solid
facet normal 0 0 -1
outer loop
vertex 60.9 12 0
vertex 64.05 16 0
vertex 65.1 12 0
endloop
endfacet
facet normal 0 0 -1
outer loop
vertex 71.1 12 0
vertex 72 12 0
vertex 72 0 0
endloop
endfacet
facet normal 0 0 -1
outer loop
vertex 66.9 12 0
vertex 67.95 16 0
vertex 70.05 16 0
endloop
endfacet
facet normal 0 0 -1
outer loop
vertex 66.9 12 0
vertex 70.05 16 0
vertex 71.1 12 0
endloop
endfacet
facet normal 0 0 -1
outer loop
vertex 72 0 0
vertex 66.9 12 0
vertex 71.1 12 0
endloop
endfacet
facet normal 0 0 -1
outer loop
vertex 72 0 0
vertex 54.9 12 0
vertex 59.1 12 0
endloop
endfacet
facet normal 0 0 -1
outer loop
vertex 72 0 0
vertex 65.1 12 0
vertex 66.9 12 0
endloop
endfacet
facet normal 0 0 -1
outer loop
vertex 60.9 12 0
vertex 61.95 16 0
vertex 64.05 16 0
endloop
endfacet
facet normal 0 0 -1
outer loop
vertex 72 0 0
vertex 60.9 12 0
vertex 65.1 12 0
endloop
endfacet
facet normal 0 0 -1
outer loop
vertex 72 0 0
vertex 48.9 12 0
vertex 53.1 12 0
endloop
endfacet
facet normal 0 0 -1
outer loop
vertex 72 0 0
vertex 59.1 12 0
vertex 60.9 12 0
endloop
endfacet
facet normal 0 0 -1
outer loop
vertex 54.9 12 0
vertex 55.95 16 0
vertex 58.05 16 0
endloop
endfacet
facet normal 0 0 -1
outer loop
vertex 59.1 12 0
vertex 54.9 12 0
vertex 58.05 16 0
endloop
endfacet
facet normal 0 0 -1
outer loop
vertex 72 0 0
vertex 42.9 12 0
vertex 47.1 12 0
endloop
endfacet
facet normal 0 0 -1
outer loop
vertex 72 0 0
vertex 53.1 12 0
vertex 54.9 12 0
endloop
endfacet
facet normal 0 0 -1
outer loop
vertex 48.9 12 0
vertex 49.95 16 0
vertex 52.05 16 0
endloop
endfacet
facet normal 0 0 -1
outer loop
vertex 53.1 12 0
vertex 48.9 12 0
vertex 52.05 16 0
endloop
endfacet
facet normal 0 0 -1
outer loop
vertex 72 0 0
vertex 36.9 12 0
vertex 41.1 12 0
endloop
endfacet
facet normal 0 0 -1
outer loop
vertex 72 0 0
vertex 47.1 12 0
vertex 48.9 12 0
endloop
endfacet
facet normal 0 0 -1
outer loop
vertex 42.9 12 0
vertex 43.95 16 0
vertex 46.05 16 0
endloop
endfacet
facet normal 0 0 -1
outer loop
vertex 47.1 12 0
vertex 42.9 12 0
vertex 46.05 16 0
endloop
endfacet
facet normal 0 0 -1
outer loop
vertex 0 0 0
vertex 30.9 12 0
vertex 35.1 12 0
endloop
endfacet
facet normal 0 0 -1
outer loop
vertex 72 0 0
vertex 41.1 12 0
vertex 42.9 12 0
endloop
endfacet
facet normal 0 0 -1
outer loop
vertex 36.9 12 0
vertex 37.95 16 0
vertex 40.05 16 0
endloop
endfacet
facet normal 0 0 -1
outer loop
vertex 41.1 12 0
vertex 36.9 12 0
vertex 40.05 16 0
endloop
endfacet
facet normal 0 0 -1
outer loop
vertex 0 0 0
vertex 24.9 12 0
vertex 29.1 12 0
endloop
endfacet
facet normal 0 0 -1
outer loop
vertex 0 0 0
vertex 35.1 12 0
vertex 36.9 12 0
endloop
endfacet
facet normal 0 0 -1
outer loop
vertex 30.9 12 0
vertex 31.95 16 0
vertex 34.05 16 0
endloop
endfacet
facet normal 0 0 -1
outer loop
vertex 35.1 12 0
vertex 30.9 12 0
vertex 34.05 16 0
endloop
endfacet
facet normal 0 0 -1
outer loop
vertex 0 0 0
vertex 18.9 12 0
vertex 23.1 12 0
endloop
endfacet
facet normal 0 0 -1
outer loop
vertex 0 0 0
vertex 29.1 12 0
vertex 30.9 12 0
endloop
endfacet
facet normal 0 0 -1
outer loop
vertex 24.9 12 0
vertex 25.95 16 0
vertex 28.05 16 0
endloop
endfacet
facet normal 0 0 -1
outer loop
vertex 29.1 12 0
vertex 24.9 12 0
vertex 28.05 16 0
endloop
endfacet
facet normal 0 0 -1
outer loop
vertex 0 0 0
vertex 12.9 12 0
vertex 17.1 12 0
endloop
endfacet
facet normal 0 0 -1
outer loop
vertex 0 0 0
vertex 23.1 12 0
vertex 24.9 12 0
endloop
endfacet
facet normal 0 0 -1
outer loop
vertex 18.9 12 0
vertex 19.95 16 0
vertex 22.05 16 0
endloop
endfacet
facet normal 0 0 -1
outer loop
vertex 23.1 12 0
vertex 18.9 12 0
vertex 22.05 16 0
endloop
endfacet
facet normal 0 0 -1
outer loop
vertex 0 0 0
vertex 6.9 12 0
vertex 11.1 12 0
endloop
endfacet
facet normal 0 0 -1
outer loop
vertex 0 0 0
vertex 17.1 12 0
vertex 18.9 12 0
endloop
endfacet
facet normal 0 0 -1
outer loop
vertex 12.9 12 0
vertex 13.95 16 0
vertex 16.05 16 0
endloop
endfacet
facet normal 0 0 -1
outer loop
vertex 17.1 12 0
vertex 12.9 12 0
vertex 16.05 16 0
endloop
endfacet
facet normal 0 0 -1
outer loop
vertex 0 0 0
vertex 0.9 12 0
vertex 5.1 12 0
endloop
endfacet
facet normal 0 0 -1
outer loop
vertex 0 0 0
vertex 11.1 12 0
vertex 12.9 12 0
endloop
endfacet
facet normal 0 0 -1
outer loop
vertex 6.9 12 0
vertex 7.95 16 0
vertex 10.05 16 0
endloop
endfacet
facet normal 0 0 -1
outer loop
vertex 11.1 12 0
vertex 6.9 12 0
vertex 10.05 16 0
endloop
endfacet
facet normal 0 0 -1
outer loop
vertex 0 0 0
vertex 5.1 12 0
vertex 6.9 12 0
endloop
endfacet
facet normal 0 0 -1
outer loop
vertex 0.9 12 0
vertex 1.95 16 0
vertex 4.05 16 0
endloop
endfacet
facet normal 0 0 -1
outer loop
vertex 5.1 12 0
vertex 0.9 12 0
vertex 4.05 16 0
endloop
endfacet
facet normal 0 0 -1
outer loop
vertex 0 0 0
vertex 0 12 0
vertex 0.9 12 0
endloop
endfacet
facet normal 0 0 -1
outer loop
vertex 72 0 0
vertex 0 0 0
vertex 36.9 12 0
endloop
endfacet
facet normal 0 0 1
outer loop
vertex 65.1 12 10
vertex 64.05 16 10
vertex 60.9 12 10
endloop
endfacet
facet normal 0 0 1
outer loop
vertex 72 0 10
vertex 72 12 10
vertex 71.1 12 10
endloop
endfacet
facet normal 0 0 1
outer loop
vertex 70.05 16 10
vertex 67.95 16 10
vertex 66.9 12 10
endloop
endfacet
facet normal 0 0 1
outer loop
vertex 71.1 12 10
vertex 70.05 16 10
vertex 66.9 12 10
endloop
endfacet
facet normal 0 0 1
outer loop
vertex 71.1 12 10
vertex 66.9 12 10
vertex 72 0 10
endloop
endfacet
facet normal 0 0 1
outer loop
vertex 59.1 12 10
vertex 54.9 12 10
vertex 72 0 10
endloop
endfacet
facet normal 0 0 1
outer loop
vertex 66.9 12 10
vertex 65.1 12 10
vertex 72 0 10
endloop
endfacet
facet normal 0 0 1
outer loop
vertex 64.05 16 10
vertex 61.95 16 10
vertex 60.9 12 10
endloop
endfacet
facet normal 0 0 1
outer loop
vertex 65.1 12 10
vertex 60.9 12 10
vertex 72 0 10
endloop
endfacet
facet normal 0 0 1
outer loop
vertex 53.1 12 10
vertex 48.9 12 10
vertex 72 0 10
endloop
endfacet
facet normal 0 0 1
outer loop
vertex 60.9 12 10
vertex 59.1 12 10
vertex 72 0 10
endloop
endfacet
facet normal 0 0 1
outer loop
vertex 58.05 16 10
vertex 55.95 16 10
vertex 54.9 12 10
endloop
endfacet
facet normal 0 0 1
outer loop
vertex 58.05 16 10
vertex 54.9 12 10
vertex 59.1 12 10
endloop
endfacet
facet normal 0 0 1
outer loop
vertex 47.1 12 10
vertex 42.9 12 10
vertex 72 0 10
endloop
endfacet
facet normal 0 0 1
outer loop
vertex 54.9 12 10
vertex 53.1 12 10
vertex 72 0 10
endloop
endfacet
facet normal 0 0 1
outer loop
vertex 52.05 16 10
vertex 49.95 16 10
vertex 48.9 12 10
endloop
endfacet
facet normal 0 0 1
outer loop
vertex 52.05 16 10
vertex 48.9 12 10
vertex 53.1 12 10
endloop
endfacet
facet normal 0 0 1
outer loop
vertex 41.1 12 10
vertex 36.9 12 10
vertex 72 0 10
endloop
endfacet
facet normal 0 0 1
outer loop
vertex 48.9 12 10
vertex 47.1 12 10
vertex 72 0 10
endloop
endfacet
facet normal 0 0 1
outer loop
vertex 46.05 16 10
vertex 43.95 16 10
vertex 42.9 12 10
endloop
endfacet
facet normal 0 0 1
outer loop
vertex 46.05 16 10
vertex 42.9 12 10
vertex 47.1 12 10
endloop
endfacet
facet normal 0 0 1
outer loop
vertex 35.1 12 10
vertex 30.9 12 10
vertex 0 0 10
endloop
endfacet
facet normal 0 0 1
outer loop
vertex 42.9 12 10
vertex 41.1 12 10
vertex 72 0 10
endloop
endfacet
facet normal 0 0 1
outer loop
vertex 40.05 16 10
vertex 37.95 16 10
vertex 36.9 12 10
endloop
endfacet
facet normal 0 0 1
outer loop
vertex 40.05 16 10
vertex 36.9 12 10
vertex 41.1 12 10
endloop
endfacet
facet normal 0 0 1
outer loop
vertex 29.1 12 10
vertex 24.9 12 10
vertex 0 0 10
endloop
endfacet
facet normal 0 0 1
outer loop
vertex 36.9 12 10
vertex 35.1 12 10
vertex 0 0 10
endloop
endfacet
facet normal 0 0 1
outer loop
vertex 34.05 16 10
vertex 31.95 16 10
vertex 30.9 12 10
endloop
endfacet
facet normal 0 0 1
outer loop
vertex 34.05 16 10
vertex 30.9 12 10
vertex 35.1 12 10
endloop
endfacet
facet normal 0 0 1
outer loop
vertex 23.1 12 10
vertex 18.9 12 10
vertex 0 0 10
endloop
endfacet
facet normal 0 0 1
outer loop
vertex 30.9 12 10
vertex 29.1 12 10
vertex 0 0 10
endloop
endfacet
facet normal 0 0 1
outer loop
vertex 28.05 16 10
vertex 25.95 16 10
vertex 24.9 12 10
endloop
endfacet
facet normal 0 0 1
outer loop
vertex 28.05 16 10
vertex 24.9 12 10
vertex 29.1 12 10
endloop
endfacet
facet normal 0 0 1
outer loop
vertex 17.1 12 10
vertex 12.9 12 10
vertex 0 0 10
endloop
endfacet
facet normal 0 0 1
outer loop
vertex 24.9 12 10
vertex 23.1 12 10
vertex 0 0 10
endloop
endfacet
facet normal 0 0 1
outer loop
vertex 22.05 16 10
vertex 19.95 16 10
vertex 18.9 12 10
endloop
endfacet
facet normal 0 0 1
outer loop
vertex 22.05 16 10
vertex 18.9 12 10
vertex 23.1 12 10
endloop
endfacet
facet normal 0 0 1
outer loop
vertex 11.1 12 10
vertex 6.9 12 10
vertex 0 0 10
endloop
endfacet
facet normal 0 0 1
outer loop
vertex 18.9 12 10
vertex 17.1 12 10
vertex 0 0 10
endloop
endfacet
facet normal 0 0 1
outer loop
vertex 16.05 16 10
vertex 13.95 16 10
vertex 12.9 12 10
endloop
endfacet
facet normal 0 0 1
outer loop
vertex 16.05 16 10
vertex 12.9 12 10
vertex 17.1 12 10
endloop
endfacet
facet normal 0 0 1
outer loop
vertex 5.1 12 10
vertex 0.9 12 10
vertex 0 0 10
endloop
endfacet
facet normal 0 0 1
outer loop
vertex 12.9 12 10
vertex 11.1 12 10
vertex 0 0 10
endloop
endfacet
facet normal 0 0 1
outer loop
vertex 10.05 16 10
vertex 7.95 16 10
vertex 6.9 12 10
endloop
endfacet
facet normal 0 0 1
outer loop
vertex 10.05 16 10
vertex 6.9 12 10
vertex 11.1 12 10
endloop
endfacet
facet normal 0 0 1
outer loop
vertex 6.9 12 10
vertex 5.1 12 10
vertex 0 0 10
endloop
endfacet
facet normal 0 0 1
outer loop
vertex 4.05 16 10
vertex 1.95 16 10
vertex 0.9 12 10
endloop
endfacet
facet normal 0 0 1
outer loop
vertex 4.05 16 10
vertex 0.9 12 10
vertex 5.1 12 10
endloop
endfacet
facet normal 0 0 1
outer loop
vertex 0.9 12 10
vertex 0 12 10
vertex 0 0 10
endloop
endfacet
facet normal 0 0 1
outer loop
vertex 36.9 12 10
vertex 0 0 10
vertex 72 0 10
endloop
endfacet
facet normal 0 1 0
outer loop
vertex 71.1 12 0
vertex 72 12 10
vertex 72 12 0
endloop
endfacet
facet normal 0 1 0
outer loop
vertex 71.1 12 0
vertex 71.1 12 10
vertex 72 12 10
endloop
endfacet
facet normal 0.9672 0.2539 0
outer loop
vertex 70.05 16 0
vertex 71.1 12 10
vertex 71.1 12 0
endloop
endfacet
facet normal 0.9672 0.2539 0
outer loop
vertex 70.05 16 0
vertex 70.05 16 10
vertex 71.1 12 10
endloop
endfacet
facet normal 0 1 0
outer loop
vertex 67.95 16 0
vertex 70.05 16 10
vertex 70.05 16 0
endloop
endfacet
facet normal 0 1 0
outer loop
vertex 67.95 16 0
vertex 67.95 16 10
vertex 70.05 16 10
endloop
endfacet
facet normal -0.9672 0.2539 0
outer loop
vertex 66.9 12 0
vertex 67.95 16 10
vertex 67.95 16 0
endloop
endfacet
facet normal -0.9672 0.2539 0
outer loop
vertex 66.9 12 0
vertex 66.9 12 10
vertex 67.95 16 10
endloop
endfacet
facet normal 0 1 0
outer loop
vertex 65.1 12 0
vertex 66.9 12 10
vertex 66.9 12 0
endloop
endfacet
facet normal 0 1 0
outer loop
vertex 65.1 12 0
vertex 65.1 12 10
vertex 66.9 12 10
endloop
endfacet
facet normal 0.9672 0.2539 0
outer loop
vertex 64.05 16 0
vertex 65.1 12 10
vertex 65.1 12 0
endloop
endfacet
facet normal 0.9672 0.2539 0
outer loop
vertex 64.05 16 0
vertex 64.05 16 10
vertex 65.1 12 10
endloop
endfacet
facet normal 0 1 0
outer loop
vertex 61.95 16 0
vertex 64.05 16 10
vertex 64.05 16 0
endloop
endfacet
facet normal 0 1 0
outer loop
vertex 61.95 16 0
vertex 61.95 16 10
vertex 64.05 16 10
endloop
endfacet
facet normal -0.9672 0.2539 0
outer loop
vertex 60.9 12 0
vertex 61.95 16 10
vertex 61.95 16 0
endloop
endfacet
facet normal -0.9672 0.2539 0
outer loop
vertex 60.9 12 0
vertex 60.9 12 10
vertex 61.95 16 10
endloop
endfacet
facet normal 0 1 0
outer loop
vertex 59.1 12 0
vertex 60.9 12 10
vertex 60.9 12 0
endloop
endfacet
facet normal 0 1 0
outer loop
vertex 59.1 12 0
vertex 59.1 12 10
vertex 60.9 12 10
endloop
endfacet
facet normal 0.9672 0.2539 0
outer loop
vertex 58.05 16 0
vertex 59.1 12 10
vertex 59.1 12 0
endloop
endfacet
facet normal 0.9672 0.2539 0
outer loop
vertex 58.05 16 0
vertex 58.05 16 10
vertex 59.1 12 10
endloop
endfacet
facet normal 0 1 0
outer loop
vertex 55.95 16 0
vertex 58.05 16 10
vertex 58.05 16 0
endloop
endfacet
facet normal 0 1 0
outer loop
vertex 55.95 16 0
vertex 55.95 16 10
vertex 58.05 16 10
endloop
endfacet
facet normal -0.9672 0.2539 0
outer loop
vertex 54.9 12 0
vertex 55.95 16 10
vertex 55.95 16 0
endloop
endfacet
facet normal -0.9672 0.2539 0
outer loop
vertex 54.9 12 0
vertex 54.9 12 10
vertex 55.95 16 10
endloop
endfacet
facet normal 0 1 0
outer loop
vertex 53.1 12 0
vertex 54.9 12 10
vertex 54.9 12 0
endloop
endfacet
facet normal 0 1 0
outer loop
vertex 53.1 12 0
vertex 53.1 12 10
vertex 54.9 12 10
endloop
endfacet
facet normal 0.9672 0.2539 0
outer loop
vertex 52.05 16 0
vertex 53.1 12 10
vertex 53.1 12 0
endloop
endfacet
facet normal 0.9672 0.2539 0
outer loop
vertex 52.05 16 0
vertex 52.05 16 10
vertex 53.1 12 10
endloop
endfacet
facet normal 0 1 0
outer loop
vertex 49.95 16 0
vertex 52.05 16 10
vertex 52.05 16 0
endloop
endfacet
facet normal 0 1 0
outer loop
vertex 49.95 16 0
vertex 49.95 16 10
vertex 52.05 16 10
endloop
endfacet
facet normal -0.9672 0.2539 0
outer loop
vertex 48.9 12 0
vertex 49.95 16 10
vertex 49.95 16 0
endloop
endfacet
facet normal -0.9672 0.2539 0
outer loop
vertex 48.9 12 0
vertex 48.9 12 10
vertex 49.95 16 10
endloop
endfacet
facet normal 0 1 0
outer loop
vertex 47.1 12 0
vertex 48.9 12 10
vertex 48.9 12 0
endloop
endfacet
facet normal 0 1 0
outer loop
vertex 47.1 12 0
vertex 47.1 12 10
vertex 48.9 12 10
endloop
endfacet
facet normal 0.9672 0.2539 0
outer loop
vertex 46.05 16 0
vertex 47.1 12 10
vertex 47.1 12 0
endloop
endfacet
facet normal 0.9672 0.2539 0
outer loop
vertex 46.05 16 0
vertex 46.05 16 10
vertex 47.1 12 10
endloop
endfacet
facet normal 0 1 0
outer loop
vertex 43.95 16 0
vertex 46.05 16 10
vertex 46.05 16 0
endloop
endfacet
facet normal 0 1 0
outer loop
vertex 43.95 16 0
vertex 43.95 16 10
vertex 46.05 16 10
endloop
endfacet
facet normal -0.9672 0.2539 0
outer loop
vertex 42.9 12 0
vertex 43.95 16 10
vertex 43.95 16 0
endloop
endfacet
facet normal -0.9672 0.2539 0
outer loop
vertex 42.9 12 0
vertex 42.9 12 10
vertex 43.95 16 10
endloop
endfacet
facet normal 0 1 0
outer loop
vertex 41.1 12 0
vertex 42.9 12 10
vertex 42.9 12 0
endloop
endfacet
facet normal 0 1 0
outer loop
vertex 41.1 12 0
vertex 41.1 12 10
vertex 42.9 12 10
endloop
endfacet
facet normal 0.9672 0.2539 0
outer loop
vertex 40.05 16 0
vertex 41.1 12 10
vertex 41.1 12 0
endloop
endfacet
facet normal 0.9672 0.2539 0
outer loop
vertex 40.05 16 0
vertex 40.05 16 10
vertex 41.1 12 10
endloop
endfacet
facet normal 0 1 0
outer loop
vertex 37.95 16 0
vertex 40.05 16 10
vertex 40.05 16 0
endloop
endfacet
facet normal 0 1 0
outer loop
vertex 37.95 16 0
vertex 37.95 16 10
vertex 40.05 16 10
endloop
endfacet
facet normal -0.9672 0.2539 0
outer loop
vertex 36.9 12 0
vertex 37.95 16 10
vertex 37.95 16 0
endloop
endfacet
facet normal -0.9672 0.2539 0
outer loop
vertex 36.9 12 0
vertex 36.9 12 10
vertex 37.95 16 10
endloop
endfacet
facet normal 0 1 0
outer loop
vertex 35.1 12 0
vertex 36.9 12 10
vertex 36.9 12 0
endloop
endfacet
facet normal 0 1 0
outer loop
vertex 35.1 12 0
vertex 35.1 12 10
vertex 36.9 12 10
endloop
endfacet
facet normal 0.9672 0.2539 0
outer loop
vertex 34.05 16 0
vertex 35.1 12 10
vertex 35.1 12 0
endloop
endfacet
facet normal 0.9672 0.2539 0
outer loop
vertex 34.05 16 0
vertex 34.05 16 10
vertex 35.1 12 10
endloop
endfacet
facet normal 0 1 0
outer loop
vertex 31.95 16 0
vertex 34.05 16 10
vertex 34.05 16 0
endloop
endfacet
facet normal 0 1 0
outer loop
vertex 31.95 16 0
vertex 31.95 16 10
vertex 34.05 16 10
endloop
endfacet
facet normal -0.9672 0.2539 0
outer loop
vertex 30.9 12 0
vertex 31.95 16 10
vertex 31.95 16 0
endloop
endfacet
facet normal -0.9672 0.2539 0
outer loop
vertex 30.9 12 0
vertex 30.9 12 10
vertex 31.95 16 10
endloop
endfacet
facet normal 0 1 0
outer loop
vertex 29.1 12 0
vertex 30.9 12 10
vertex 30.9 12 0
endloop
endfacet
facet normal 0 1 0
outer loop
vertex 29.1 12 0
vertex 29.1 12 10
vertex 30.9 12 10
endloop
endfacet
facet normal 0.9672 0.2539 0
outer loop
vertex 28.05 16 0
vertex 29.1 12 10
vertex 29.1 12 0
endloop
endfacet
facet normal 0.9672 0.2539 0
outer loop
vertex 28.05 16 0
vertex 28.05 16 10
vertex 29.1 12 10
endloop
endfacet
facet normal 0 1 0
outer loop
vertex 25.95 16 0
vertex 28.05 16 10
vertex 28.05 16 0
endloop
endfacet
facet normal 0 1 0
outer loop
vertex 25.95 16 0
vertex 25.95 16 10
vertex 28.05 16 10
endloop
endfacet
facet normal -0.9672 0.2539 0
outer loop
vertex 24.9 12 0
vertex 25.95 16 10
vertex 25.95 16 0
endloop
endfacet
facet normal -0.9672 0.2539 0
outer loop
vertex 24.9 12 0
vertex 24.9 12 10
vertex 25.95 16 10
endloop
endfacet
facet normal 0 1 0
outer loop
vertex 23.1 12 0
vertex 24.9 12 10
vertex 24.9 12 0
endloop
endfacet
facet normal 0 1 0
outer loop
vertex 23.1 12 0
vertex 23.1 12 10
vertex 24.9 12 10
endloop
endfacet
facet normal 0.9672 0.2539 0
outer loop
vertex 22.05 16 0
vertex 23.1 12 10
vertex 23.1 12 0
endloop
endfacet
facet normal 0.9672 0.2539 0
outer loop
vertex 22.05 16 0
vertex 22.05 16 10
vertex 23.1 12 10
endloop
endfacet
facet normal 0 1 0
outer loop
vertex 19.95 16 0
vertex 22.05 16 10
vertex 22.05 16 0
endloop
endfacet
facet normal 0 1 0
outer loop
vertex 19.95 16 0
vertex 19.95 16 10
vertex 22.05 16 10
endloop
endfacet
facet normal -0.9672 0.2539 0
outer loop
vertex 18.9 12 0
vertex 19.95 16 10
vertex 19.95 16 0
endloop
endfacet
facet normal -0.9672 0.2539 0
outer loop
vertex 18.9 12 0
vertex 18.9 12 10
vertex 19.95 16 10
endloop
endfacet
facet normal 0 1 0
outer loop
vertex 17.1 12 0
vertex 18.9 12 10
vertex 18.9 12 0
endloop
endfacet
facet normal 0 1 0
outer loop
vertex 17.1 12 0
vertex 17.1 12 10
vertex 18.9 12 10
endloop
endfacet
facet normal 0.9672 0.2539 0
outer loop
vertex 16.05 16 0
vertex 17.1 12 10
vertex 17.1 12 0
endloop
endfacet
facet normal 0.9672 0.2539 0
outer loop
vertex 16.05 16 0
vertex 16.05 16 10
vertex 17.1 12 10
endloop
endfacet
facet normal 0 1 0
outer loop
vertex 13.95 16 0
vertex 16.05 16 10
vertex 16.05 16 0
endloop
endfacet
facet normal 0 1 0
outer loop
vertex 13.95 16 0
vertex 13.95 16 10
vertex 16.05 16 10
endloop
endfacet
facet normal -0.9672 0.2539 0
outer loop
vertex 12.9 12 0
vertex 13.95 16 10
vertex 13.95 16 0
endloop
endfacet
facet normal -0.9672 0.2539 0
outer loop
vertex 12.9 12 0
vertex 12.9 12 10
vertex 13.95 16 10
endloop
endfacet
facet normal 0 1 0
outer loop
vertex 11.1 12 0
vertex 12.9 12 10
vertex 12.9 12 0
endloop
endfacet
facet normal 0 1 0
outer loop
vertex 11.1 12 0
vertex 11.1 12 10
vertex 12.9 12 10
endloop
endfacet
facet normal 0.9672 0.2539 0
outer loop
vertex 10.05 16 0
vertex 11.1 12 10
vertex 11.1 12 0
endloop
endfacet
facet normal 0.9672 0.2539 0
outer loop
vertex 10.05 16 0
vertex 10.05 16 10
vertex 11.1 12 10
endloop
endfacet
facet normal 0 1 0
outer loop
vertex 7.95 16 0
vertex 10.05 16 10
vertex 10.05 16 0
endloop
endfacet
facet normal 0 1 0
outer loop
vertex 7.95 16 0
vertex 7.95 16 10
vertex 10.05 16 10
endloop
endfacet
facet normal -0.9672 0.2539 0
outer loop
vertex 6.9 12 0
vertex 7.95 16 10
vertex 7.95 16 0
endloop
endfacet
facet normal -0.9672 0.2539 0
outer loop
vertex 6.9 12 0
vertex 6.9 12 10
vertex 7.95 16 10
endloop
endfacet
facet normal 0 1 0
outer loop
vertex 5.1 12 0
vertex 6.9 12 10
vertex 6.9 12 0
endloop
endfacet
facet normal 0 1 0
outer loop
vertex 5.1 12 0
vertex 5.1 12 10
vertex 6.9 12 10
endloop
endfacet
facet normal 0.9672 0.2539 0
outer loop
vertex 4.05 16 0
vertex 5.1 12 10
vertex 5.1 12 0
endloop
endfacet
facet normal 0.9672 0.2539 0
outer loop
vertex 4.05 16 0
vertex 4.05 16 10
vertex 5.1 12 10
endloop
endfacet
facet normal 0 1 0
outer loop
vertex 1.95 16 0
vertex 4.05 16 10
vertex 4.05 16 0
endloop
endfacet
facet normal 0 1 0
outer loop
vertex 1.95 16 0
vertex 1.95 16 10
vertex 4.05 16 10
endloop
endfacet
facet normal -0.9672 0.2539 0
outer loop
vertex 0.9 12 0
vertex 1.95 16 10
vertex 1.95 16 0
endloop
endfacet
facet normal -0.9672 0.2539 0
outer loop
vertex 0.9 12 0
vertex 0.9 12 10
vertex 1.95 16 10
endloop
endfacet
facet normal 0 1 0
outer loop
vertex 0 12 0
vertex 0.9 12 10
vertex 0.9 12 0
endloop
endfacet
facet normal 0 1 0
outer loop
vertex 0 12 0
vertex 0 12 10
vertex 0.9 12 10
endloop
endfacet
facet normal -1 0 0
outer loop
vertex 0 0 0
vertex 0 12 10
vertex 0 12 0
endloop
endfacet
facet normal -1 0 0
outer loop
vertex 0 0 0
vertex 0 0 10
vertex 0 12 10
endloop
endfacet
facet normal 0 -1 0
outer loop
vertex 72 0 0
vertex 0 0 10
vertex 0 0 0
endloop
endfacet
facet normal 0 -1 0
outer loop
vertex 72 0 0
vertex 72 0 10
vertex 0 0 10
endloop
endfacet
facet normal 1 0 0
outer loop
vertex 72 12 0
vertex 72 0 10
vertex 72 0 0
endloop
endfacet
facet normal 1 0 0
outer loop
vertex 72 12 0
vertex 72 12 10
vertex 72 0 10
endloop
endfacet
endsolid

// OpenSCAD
$fn = 32;

// ----------------------------------------------------------------------
// Gear rack: 12 teeth, pitch 6 mm
// ----------------------------------------------------------------------

// --- parameters (mm) ---
teeth = 12;               // number of teeth
pitch = 6;                // tooth pitch, X
root_w = 4.2;             // tooth width at the root
tip_w = 2.1;              // tooth width at the tip
base_h = 12;              // rack body height, Y
tooth_h = 4;              // tooth height above the body
plate_t = 10;             // rack width, Z (extrusion height)
fit_tol = 0.02;           // declared fit tolerance (prompt contract)
free_tol = 0.2;           // declared free tolerance (prompt contract)

rack_l = teeth * pitch;  // overall length
total_h = base_h + tooth_h;  // overall height

profile = [[0, 0], [72, 0], [72, 12], [71.1, 12], [70.05, 16], [67.95, 16], [66.9, 12], [65.1, 12], [64.05, 16], [61.95, 16], [60.9, 12], [59.1, 12], [58.05, 16], [55.95, 16], [54.9, 12], [53.1, 12], [52.05, 16], [49.95, 16], [48.9, 12], [47.1, 12], [46.05, 16], [43.95, 16], [42.9, 12], [41.1, 12], [40.05, 16], [37.95, 16], [36.9, 12], [35.1, 12], [34.05, 16], [31.95, 16], [30.9, 12], [29.1, 12], [28.05, 16], [25.95, 16], [24.9, 12], [23.1, 12], [22.05, 16], [19.95, 16], [18.9, 12], [17.1, 12], [16.05, 16], [13.95, 16], [12.9, 12], [11.1, 12], [10.05, 16], [7.95, 16], [6.9, 12], [5.1, 12], [4.05, 16], [1.95, 16], [0.9, 12], [0, 12]];  // primary outline, 52 points, counter clockwise

// --- the one profile operation ---
linear_extrude(height = plate_t) polygon(points = profile);
